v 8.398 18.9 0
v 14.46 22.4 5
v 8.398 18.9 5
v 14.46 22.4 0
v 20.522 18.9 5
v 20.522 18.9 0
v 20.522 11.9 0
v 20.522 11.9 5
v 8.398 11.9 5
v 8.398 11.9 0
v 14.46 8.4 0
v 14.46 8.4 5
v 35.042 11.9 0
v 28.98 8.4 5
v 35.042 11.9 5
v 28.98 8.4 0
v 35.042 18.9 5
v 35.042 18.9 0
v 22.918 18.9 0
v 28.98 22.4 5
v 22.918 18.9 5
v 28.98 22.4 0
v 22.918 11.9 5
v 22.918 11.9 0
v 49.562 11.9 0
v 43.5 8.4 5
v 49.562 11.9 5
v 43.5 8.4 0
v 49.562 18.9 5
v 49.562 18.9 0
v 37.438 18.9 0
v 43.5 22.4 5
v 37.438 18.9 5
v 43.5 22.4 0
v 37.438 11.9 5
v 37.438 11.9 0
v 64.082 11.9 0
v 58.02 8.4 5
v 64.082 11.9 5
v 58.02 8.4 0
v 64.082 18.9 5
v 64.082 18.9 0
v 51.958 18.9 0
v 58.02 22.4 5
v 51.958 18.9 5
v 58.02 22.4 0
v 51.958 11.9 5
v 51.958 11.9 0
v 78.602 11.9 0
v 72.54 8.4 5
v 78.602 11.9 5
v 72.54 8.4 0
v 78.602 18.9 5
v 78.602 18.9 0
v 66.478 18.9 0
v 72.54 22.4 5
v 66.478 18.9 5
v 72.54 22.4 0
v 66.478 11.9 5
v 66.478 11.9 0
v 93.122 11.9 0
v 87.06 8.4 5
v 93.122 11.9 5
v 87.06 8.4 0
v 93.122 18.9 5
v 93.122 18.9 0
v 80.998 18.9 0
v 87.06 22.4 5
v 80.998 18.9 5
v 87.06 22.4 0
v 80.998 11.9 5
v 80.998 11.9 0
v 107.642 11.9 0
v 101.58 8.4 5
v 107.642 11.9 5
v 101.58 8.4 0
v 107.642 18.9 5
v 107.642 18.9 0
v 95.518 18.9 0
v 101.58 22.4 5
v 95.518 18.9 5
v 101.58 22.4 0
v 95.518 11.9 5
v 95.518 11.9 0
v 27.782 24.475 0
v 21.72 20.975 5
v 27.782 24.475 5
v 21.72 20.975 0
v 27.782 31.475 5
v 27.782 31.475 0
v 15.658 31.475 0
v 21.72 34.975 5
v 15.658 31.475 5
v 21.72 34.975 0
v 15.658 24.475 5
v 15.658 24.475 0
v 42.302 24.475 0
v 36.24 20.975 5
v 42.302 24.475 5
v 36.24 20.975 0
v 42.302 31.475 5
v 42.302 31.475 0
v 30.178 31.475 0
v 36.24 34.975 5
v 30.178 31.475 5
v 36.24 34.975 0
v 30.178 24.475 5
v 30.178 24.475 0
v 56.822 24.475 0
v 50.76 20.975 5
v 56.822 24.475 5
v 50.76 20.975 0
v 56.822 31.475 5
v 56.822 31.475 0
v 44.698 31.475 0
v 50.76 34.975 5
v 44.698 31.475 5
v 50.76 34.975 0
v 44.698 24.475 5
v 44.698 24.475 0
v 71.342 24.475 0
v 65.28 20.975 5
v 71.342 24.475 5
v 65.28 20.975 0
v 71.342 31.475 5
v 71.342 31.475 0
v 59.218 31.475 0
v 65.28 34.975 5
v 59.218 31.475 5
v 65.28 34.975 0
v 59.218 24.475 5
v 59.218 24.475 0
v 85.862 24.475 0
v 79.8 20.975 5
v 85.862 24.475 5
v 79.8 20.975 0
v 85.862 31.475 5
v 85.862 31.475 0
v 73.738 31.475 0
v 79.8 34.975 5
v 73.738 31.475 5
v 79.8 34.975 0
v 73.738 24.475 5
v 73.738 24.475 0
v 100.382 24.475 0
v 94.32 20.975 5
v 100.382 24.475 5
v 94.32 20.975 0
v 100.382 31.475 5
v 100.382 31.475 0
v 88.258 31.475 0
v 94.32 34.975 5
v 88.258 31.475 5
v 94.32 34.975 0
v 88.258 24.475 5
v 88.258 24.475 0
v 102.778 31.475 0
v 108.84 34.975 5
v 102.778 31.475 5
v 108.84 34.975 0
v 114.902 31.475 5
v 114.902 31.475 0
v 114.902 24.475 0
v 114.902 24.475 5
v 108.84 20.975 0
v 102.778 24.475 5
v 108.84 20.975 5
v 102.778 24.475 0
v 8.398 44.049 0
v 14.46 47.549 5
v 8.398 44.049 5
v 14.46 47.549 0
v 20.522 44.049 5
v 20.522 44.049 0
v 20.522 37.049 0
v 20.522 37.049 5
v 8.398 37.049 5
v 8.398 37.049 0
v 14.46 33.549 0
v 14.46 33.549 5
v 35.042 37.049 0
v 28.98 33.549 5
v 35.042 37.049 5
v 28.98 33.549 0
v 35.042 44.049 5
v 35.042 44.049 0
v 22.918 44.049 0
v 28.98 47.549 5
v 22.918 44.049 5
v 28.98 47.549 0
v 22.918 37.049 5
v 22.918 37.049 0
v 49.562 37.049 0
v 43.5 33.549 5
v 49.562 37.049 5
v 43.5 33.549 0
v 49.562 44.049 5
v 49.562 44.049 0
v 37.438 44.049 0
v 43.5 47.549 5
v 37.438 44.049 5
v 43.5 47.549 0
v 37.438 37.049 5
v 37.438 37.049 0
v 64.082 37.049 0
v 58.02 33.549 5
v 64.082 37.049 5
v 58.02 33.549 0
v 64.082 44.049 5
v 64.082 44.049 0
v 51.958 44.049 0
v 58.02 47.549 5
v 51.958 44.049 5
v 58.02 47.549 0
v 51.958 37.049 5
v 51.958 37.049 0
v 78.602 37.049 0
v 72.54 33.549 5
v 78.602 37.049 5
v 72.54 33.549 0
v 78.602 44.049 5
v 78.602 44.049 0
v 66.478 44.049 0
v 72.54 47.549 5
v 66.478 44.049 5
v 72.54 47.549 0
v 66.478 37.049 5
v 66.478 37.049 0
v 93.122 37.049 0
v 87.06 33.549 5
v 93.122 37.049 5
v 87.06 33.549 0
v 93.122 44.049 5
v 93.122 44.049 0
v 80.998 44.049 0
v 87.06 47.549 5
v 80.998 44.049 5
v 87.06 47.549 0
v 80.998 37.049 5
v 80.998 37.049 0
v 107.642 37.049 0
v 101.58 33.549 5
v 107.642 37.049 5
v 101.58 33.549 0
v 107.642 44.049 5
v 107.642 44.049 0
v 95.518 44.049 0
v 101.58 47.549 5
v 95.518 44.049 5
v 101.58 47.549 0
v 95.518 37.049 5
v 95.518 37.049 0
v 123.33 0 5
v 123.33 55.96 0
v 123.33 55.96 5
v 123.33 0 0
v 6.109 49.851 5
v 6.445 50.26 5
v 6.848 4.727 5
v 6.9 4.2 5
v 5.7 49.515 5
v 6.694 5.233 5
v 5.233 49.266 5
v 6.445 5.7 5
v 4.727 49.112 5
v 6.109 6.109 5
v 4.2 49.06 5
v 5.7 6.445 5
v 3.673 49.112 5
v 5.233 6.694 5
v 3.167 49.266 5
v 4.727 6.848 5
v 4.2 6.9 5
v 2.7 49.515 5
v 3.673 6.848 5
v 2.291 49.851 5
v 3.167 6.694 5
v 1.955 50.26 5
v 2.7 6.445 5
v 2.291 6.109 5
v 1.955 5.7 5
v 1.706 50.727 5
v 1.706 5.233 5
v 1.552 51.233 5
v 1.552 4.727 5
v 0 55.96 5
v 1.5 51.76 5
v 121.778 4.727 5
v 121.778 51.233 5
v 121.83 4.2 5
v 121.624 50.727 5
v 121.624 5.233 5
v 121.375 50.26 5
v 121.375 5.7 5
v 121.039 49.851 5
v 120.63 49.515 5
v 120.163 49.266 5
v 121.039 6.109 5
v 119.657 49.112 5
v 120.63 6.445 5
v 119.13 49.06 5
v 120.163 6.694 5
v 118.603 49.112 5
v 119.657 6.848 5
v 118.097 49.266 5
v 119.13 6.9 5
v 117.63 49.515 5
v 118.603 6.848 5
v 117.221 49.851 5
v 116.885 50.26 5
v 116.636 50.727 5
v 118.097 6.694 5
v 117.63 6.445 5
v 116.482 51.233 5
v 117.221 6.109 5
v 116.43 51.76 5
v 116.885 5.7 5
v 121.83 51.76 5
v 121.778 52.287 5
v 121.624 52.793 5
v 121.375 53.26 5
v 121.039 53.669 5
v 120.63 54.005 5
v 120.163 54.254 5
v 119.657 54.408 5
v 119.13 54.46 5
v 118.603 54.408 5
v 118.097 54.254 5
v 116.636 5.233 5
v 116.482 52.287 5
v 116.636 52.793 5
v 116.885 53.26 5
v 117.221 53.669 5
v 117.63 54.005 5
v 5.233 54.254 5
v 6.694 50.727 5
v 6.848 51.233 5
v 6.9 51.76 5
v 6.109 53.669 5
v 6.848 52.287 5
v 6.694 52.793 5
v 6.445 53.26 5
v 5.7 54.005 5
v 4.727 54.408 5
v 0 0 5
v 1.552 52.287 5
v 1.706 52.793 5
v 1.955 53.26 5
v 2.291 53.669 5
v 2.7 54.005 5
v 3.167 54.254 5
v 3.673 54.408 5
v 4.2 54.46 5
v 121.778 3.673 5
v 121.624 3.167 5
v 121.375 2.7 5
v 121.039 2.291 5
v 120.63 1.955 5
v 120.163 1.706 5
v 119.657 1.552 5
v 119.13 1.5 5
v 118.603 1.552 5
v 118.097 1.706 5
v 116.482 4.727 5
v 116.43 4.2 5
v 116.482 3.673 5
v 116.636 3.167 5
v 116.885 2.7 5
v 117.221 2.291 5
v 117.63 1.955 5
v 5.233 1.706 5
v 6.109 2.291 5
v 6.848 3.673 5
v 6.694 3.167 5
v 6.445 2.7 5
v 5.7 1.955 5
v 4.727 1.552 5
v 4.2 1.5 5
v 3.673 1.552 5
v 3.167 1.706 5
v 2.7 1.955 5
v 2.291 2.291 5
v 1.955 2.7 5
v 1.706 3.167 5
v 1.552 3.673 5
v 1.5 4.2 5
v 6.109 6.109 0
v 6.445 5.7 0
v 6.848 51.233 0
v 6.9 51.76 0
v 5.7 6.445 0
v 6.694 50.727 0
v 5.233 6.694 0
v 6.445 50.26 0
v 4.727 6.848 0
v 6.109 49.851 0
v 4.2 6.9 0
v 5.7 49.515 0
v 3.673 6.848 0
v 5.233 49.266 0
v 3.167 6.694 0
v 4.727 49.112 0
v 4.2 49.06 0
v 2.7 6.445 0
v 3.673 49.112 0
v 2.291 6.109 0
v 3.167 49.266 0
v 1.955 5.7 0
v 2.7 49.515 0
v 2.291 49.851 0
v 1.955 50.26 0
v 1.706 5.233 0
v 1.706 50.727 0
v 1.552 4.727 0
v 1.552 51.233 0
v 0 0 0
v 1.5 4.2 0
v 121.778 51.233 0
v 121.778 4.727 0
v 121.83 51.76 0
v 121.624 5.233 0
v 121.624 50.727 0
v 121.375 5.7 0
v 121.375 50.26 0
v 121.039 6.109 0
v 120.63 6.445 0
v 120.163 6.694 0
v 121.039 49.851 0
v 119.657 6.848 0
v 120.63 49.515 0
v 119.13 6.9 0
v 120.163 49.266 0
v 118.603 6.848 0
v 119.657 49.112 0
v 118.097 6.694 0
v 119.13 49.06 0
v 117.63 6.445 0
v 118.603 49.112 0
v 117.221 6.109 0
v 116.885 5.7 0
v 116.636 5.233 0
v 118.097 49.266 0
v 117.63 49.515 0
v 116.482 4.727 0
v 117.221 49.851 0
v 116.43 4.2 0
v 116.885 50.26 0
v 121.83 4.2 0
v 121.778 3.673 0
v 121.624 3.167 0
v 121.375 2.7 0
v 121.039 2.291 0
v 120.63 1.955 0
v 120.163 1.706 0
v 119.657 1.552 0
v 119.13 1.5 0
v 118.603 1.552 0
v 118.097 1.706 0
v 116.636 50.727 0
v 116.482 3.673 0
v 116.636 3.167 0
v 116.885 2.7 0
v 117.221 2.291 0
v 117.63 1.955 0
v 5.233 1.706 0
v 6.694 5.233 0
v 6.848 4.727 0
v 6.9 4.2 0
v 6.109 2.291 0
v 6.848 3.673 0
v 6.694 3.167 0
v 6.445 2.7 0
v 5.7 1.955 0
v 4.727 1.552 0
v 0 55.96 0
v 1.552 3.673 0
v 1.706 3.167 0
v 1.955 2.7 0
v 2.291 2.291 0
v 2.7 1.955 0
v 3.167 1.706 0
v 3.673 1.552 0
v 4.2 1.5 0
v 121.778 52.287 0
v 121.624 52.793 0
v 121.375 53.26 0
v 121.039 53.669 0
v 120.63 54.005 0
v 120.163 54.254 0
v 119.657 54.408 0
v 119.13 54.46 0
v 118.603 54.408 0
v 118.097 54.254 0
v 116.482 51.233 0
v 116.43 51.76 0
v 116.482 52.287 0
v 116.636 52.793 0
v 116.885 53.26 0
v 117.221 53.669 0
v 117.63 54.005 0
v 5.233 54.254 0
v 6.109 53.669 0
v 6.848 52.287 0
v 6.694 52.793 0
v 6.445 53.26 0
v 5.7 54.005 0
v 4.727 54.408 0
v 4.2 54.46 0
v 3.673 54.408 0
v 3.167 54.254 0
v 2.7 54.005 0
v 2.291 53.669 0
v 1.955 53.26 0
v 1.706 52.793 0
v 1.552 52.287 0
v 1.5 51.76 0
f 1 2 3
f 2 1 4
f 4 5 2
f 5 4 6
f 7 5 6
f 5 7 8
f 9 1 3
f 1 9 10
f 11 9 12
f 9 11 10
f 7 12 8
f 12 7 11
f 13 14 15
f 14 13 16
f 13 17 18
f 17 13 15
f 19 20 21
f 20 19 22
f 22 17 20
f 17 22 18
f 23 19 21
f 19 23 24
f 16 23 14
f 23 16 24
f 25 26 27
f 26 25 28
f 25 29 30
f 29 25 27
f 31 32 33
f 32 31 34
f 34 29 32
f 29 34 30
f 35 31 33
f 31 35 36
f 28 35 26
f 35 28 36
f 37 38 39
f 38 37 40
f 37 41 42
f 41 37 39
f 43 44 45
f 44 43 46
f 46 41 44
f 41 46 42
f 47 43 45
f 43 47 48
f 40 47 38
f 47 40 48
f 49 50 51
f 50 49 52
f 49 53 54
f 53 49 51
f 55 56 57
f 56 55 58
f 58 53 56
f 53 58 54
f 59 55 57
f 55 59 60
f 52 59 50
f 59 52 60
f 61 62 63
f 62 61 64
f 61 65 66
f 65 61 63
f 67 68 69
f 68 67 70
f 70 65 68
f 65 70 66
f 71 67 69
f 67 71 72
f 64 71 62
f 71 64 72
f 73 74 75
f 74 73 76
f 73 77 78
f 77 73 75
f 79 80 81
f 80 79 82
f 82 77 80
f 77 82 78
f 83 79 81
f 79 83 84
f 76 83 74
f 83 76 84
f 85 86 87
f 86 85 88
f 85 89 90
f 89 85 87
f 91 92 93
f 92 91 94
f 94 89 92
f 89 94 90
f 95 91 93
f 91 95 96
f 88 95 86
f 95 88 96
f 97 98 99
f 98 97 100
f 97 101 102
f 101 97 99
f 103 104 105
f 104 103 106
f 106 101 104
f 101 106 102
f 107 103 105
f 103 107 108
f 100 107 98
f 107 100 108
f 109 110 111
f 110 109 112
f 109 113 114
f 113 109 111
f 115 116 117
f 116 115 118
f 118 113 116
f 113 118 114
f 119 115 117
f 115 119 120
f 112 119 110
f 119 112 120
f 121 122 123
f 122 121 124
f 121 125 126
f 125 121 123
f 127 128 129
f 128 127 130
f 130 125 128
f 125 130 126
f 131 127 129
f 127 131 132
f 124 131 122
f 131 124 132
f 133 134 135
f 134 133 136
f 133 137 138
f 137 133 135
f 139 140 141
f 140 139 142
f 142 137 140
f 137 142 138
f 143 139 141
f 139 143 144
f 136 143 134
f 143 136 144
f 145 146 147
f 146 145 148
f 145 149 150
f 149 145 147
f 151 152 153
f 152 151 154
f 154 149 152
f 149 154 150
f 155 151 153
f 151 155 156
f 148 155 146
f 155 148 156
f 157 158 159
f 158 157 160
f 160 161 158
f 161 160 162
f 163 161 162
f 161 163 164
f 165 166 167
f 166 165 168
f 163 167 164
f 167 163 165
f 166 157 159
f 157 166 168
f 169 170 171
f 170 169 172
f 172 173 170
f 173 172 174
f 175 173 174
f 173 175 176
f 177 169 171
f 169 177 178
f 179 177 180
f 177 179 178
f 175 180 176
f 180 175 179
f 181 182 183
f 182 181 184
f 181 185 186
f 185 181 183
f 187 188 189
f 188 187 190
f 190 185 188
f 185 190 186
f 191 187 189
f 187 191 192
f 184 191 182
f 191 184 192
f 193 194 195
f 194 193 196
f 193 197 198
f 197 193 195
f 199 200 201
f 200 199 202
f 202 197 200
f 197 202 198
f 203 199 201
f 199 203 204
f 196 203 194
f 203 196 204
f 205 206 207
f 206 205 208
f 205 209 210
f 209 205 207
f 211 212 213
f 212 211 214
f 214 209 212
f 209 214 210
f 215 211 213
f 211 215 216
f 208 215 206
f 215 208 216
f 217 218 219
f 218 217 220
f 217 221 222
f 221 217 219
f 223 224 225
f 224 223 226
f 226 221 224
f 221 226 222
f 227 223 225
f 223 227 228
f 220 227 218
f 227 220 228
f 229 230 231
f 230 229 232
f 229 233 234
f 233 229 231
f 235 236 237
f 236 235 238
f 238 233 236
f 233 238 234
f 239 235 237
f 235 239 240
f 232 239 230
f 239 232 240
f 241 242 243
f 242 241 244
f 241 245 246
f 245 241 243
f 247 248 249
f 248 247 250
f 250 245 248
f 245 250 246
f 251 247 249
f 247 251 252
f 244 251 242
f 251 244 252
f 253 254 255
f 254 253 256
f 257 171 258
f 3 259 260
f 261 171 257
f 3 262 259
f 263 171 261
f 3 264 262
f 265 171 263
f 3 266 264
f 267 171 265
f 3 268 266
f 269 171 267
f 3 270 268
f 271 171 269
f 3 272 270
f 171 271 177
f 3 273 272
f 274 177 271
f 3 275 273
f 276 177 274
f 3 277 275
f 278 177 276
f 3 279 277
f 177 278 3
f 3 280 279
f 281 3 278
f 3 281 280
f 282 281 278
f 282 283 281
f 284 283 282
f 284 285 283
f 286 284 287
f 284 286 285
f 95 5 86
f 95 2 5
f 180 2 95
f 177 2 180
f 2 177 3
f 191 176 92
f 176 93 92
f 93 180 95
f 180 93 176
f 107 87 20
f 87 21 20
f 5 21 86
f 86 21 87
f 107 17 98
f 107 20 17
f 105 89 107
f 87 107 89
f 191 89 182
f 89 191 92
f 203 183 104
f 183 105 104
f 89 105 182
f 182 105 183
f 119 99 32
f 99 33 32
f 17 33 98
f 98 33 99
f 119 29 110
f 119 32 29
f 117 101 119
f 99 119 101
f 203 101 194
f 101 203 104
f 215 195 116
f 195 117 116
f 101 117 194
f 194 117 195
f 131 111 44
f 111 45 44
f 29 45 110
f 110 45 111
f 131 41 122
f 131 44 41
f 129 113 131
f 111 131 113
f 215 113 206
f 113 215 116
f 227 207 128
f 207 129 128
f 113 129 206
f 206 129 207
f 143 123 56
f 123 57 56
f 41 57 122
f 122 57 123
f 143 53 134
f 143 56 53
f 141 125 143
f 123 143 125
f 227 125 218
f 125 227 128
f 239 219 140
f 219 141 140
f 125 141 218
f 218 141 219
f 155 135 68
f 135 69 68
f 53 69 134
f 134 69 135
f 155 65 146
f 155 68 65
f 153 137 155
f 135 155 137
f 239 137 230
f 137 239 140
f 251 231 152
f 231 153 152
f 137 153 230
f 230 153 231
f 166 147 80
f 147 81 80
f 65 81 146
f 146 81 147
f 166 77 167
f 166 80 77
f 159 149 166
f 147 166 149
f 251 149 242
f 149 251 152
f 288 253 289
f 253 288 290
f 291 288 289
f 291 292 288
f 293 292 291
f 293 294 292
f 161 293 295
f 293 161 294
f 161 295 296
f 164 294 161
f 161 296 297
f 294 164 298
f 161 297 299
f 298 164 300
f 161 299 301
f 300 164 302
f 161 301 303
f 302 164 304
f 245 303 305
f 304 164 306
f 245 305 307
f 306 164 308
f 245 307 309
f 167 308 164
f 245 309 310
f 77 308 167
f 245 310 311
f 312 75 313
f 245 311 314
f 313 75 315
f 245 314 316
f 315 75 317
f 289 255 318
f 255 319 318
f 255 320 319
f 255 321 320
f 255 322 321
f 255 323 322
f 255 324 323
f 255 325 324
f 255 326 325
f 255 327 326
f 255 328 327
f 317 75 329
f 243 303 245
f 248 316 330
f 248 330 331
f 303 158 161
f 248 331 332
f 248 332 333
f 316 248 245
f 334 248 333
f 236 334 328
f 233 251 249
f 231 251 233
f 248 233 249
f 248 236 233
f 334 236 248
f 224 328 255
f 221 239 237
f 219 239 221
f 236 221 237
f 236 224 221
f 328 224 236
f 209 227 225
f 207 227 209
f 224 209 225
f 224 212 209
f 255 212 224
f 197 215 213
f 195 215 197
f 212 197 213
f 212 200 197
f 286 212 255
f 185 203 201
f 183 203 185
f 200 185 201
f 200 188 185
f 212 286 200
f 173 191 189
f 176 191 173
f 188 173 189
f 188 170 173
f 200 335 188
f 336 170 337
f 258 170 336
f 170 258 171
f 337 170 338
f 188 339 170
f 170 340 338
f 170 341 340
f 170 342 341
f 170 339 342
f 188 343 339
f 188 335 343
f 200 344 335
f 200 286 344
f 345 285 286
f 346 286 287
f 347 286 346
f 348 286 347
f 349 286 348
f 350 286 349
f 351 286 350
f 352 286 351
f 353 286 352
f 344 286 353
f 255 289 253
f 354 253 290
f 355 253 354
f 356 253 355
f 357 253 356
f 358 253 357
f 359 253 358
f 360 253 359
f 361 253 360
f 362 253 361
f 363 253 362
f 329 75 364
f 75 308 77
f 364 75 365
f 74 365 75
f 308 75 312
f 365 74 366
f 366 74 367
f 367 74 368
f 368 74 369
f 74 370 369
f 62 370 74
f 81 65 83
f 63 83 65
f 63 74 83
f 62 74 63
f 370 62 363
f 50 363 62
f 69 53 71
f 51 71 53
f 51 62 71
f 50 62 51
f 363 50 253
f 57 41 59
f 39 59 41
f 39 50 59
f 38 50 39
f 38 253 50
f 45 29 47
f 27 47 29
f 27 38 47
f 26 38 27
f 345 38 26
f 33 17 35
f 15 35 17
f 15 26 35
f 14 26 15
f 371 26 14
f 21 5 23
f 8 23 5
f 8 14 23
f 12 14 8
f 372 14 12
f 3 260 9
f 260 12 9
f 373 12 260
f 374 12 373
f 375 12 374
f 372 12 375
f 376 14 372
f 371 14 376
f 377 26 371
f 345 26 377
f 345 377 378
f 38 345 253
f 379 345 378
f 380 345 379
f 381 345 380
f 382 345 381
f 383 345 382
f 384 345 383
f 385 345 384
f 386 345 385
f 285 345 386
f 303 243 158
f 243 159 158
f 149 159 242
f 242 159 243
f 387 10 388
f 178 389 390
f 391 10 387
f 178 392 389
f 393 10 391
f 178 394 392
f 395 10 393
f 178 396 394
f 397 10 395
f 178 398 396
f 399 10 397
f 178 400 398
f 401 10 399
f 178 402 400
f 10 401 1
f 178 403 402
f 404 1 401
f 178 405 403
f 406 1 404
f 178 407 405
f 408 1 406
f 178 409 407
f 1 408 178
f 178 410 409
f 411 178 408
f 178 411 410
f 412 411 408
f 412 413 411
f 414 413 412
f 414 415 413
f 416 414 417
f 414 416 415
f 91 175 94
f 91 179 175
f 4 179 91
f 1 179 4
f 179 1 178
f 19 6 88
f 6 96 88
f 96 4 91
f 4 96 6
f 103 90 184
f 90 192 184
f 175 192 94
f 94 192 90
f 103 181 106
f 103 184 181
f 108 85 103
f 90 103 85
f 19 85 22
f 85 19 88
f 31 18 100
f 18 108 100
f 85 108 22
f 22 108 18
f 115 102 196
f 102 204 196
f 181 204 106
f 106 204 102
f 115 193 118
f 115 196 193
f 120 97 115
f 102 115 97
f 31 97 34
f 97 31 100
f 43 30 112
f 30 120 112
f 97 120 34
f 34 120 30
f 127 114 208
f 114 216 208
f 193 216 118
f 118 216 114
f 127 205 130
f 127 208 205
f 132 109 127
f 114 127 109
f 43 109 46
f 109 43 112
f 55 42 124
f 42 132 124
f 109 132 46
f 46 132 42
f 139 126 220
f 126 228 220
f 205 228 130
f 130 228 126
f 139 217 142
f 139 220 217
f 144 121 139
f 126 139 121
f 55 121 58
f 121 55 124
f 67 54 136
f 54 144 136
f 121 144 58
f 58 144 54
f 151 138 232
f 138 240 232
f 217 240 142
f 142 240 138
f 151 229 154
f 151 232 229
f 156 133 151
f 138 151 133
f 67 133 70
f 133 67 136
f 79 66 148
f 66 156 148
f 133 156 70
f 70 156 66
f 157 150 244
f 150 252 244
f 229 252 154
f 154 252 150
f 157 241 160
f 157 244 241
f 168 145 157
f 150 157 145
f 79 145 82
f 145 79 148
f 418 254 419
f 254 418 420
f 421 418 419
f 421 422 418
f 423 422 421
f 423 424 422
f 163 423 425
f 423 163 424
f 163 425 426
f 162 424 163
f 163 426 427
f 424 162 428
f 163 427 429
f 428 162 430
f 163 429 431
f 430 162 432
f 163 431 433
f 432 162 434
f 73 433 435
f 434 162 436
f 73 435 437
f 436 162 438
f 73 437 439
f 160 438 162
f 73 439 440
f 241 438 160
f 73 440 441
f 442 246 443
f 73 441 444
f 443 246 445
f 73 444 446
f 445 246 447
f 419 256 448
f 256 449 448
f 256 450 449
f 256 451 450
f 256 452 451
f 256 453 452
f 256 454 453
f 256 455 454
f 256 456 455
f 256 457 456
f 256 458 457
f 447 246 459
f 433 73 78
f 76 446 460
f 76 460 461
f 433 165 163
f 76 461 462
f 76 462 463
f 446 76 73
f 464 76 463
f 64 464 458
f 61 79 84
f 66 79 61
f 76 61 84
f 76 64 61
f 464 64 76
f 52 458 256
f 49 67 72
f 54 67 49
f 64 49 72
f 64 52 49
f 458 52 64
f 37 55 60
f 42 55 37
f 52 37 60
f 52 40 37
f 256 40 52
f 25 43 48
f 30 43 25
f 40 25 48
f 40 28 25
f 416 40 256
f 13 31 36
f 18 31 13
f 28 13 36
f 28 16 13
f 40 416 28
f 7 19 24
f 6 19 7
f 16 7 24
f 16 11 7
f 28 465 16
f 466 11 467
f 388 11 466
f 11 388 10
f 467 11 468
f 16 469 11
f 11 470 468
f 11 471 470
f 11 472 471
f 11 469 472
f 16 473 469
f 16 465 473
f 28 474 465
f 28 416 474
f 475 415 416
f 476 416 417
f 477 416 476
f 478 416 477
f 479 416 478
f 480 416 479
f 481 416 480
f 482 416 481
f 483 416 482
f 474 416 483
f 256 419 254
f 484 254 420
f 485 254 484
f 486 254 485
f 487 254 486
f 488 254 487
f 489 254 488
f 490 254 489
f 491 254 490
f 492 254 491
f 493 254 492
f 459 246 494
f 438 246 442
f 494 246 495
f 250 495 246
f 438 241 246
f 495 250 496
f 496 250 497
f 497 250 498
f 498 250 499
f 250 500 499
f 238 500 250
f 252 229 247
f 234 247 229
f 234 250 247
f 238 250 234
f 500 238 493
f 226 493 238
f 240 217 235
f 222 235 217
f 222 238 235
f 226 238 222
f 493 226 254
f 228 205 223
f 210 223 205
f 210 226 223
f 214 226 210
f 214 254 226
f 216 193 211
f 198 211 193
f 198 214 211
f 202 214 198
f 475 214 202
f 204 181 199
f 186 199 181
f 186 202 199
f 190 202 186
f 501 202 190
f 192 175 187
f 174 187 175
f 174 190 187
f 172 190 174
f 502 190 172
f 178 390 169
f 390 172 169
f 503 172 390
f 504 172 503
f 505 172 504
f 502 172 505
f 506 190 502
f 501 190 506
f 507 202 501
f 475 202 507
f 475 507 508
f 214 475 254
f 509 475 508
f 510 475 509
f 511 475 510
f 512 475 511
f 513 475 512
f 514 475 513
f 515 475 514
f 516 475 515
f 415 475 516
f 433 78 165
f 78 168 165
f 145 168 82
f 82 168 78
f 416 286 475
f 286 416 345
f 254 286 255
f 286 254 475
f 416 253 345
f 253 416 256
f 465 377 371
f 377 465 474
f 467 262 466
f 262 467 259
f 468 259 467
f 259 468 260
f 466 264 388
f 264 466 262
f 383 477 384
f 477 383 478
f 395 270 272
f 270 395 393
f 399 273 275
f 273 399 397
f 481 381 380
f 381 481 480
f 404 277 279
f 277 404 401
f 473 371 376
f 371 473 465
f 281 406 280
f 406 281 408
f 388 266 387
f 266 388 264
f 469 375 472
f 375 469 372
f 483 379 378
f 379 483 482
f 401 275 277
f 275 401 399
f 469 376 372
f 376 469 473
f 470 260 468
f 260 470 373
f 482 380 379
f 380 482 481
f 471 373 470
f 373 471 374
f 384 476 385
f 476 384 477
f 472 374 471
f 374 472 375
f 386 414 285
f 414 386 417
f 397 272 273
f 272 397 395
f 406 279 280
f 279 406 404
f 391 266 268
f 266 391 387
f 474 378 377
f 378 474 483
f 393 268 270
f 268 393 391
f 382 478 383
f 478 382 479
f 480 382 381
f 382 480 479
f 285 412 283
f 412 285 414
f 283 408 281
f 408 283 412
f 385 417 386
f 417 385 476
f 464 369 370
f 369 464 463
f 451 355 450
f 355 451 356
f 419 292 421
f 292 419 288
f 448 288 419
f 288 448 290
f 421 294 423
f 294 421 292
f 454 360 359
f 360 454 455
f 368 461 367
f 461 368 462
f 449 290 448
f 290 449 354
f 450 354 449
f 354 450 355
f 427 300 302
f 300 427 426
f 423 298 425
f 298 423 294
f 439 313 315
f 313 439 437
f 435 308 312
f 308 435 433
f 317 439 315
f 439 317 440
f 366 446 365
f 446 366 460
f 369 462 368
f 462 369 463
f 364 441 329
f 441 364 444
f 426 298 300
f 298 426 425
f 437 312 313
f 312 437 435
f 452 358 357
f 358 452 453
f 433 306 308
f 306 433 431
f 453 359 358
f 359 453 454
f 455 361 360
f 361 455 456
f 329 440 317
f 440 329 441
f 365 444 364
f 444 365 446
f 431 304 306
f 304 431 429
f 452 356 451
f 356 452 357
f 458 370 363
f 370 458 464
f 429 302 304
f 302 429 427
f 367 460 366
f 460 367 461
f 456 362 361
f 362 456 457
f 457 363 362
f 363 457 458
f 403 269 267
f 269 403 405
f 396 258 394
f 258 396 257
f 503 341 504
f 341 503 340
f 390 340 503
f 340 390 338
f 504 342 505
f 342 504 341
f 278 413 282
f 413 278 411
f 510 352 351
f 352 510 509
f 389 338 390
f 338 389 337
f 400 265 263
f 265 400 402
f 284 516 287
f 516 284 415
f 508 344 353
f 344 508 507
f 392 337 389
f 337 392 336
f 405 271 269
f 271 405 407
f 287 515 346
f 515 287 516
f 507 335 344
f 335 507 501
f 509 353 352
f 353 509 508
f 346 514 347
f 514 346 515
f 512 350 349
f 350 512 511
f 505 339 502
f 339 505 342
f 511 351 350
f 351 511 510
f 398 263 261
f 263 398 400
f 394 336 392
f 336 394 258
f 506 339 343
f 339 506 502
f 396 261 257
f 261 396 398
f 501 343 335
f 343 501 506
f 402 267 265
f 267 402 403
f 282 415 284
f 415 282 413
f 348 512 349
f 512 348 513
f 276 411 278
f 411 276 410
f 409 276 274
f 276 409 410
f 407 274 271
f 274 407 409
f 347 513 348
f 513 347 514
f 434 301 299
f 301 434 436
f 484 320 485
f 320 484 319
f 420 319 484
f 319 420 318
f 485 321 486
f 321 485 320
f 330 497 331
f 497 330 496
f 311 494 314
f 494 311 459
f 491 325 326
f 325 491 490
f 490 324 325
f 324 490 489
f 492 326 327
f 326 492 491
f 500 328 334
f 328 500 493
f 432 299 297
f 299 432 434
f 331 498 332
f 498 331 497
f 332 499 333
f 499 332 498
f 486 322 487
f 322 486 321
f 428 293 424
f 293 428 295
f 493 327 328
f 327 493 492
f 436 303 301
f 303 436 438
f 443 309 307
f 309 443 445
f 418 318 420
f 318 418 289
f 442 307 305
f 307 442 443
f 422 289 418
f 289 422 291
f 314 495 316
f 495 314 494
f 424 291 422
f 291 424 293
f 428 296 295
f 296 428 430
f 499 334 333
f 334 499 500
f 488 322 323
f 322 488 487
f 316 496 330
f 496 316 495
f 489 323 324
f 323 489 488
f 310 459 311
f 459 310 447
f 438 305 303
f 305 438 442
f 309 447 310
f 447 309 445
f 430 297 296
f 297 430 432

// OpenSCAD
$fn = 32;

// ----------------------------------------------------------------------
// Honeycomb panel: 123.33 x 55.96 mm, 21 cells of 14 mm
// ----------------------------------------------------------------------

// --- parameters (mm) ---
panel_w = 123.33;         // panel width
panel_d = 55.96;          // panel depth
thick = 5;                // panel thickness
cell_r = 7;               // hex cell circumradius
pitch = 14.52;            // hex cell pitch (centre to centre)
web = 2.4;                // web between the cells
columns = 7;              // columns of cells
rows = 3;                 // rows of cells
cell_count = 21;          // total cells
shift_x = 14.46;          // first cell offset in x
shift_y = 15.4;           // first cell offset in y
mount_d = 5.4;            // corner mounting holes
hole_off = 4.2;           // mounting hole offset from the corners

difference() {
  union() {
    cube([panel_w, panel_d, thick]);
  }
  /* hexagonal cells, point-up, cut right through the plate */
  for (row = [0 : rows - 1]) {
    for (col = [0 : columns - 1]) {
      translate([shift_x + col * pitch + (row % 2) * pitch / 2, shift_y + row * pitch * 0.866025, -2.5]) rotate([0, 0, 30]) cylinder(h = thick + 5, d = 2 * cell_r, $fn = 6);
    }
  }
  /* corner mounting holes, clear of the outer cell web */
  translate([4.2, 4.2, -2.5]) cylinder(h = thick + 5, d = mount_d);
  translate([119.13, 4.2, -2.5]) cylinder(h = thick + 5, d = mount_d);
  translate([4.2, 51.76, -2.5]) cylinder(h = thick + 5, d = mount_d);
  translate([119.13, 51.76, -2.5]) cylinder(h = thick + 5, d = mount_d);
}
